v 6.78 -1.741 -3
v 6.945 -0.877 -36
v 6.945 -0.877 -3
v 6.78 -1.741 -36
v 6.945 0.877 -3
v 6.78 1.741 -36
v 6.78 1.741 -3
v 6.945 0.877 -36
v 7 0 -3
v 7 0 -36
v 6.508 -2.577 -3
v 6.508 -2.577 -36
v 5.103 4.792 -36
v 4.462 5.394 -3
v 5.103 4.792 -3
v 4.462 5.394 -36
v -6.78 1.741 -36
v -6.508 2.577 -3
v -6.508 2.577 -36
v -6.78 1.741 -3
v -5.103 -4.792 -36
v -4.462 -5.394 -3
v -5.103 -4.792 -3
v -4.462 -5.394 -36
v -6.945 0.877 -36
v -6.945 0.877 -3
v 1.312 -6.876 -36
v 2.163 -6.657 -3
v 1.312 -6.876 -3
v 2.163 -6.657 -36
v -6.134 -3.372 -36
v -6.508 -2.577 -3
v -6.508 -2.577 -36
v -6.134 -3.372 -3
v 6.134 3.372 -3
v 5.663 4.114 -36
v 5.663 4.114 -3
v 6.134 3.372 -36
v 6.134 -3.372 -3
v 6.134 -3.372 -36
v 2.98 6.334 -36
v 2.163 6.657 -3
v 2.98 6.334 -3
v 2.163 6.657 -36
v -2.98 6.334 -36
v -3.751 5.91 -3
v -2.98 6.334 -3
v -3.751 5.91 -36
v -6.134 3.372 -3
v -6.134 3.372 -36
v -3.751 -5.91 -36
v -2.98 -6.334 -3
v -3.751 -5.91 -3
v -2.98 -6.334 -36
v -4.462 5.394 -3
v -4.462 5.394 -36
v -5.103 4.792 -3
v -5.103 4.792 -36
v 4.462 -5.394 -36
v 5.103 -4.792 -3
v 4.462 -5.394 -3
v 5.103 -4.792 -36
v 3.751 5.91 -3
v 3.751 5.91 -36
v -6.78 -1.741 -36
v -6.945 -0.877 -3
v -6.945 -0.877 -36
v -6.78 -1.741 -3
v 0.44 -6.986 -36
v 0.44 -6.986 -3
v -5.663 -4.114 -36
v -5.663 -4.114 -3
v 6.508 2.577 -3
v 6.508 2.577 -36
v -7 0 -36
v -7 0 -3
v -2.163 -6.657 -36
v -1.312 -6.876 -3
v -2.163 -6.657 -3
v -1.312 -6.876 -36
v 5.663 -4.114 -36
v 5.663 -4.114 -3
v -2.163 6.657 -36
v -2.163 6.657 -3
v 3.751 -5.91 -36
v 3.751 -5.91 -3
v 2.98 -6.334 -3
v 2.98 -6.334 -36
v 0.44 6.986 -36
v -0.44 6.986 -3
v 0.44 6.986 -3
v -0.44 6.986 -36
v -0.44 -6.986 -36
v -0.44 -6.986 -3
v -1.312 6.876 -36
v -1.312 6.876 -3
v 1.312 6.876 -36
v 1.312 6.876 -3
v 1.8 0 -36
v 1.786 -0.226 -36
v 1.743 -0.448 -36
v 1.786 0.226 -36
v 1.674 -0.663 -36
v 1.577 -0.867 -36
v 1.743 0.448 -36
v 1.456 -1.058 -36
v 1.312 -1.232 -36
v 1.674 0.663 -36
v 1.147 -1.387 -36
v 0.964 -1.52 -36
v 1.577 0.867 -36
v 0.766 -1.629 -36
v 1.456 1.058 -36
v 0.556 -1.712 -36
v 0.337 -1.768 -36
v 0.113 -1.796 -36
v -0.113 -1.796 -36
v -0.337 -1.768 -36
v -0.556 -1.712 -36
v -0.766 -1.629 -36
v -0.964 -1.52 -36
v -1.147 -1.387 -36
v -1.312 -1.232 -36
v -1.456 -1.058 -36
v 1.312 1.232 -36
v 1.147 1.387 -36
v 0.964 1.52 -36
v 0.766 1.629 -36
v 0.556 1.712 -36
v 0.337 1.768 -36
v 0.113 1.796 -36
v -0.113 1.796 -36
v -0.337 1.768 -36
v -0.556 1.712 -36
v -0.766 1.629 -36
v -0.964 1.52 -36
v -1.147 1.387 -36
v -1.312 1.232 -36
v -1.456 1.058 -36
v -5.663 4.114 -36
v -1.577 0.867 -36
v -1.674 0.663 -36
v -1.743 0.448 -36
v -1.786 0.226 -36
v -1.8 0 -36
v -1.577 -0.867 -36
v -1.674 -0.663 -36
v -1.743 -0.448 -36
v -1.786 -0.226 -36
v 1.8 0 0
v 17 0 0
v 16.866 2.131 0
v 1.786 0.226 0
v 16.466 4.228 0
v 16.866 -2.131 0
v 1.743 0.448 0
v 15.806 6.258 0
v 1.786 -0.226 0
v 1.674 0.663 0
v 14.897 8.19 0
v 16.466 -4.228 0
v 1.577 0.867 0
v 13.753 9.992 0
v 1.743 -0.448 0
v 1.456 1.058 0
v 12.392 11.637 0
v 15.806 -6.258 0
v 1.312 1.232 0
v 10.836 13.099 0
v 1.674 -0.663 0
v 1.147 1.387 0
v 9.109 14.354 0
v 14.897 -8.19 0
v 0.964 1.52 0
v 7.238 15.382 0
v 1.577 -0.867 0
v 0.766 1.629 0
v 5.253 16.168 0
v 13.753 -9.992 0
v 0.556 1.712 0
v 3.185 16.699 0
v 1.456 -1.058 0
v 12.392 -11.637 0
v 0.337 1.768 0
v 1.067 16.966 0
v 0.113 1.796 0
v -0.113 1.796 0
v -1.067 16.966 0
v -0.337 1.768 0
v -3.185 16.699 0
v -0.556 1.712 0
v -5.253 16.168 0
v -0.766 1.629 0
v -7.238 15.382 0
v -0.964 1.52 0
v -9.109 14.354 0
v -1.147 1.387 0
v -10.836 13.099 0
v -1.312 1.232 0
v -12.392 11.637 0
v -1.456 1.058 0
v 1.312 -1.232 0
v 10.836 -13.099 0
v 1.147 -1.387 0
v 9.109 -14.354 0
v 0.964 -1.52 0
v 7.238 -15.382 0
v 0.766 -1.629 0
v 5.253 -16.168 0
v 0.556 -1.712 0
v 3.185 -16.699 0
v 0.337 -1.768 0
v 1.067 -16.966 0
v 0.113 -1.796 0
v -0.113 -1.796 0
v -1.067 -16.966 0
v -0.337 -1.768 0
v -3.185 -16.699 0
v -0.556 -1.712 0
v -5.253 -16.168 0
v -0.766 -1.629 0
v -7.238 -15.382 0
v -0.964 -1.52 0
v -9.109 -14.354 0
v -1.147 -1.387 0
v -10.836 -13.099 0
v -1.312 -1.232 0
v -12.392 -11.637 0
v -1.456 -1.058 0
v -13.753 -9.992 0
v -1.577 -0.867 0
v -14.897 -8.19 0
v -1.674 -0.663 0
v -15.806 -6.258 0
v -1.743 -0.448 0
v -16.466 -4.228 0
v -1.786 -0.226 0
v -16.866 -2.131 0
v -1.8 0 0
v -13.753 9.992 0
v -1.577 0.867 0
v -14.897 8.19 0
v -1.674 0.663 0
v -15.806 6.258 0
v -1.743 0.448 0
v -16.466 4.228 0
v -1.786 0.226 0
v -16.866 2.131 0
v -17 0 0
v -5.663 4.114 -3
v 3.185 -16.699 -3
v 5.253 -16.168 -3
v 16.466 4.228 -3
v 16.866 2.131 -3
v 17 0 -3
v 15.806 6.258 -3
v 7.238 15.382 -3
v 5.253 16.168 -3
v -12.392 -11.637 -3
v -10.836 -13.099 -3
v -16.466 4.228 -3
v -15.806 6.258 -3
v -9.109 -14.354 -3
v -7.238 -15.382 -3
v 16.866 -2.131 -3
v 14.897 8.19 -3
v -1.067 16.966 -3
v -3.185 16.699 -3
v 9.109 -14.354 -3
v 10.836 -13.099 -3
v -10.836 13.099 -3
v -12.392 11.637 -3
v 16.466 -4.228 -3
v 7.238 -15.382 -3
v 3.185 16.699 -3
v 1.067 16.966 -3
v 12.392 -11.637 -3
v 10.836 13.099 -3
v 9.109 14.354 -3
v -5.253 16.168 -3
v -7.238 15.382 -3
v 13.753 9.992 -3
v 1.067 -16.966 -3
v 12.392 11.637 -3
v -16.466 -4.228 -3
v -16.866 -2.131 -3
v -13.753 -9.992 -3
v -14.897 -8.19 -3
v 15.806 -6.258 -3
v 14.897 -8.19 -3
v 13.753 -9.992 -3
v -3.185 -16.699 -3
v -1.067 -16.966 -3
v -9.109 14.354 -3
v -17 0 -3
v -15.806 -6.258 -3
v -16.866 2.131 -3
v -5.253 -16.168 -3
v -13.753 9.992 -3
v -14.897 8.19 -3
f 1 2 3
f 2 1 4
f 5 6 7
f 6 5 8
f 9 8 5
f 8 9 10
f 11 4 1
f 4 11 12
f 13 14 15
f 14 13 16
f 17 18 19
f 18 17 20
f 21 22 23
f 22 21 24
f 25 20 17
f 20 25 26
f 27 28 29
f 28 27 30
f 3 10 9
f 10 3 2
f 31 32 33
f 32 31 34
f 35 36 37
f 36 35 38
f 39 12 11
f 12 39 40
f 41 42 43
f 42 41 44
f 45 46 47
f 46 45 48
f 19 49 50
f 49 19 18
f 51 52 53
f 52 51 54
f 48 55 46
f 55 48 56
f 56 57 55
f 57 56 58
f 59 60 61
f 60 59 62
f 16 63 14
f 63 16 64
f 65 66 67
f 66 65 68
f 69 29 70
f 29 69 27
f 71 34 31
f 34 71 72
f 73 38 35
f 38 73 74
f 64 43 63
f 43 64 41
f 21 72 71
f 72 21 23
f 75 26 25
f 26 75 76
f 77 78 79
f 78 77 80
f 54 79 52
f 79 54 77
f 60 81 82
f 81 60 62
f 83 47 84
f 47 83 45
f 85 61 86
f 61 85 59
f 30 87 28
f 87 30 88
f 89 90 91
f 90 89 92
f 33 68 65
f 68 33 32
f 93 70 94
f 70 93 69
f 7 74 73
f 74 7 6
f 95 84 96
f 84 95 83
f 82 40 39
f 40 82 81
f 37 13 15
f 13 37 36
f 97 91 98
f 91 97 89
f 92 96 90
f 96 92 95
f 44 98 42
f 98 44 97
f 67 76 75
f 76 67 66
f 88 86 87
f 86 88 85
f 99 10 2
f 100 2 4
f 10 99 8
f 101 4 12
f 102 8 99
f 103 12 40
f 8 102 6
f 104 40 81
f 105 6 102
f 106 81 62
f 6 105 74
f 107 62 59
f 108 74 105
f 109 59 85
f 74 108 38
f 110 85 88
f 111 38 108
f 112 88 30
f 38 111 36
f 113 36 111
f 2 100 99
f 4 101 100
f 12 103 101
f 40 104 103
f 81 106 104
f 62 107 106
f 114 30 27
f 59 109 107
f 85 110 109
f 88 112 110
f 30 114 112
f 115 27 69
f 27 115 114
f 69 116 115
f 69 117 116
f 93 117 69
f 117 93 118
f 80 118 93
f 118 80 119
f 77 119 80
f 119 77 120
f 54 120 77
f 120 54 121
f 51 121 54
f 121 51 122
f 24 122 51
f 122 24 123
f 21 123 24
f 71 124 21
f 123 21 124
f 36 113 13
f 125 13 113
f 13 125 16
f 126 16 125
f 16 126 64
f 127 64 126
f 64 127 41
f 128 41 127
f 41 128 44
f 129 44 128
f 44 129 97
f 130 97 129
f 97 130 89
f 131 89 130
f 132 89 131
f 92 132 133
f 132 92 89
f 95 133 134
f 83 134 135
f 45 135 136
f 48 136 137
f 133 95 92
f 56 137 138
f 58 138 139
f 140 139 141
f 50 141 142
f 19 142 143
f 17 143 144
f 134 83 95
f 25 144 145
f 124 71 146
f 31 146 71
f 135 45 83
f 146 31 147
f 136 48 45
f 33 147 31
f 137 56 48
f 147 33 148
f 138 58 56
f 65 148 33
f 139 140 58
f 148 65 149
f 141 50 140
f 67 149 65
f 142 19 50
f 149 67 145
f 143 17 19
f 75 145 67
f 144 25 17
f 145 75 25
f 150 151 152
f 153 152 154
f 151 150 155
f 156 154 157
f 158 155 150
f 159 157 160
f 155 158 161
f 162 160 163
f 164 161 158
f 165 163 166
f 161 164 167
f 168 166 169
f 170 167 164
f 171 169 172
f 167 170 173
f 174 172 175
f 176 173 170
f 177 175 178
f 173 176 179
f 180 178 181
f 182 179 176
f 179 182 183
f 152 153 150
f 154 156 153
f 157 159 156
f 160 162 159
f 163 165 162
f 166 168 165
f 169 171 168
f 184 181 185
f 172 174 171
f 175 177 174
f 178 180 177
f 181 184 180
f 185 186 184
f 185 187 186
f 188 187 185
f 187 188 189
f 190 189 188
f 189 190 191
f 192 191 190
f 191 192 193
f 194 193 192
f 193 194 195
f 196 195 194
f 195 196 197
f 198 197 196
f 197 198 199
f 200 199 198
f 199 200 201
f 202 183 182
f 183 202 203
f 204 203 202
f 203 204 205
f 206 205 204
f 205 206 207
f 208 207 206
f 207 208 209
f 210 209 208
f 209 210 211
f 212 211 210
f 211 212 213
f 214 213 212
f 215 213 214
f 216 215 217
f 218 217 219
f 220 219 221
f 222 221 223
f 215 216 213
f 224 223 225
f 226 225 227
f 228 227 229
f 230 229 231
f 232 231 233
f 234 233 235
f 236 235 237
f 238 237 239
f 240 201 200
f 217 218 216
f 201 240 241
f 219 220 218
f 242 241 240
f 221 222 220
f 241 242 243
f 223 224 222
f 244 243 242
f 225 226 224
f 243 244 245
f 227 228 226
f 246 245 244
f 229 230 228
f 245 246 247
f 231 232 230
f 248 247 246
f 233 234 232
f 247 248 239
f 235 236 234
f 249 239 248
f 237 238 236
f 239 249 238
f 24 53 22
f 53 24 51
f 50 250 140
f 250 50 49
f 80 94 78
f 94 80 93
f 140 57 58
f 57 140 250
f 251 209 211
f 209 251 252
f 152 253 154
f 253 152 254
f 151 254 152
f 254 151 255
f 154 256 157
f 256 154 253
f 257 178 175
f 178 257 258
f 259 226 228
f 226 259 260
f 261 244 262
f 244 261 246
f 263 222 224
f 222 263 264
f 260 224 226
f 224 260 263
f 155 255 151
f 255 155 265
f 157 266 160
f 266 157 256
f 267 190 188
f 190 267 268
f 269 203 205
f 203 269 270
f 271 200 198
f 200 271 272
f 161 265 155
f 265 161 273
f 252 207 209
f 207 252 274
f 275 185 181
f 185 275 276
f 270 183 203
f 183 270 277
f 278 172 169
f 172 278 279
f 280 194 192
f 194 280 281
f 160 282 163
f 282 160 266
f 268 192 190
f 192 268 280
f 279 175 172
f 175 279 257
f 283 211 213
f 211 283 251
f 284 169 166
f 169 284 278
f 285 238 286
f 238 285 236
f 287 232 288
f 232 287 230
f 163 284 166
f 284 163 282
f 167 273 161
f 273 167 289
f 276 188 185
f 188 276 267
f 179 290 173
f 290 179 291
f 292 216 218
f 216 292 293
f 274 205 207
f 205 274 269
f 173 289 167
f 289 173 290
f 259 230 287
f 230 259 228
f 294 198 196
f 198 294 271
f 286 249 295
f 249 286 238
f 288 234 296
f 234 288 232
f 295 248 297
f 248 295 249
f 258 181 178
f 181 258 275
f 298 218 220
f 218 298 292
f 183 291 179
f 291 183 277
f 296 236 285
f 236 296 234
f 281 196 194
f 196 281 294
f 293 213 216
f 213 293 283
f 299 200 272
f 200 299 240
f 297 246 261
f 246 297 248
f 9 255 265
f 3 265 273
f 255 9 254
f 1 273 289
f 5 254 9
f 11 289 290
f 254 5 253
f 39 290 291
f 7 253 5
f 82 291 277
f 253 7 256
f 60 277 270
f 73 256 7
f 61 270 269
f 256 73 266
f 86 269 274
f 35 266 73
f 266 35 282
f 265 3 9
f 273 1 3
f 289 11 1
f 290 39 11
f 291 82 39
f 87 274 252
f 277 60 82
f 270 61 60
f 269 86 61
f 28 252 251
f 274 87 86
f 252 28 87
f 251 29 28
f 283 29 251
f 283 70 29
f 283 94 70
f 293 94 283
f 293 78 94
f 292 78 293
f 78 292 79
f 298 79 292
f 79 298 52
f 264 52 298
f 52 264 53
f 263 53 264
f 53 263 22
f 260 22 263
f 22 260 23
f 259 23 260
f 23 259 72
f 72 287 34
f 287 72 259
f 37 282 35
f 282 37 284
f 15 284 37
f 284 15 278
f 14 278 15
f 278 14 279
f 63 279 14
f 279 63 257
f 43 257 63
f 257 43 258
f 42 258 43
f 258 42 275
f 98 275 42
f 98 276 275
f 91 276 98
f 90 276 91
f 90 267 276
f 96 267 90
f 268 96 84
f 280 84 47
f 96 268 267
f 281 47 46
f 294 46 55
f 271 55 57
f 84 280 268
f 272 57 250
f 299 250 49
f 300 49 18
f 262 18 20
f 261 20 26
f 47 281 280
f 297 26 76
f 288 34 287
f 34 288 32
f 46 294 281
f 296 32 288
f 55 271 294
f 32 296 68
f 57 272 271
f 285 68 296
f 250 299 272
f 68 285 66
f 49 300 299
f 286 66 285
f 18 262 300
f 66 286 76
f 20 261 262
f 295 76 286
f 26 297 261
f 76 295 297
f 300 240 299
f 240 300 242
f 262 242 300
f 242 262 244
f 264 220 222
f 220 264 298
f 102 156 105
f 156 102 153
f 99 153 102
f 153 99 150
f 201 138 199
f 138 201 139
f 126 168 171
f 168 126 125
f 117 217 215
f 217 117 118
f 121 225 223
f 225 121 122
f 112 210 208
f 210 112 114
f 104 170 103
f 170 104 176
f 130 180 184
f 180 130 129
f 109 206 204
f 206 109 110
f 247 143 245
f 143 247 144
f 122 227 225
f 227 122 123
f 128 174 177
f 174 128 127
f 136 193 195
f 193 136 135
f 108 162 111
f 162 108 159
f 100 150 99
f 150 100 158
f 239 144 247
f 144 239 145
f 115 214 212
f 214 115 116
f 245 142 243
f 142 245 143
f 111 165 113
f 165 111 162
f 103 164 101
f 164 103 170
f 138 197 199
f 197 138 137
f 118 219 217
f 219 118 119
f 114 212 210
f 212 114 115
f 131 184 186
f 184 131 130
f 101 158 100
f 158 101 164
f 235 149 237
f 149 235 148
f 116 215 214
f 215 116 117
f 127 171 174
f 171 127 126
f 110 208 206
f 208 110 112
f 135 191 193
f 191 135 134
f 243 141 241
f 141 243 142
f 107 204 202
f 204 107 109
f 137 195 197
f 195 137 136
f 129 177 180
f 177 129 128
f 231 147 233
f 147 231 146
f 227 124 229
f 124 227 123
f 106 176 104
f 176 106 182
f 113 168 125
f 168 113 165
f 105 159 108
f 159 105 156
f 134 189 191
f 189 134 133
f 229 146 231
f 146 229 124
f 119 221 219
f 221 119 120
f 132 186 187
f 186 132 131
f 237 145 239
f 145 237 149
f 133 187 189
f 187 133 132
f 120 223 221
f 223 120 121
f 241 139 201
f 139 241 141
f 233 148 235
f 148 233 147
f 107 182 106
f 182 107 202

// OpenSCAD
$fn = 50;


difference() {
	union() {
		translate(v = [0, 0, -36.0000000000]) {
			cylinder(h = 36, r = 7.0000000000);
		}
		translate(v = [0, 0, -3.0000000000]) {
			cylinder(h = 3, r = 17.0000000000);
		}
	}
	union() {
		#translate(v = [0, 0, -36]) {
			cylinder(h = 36, r = 1.8000000000);
		}
	}
}
